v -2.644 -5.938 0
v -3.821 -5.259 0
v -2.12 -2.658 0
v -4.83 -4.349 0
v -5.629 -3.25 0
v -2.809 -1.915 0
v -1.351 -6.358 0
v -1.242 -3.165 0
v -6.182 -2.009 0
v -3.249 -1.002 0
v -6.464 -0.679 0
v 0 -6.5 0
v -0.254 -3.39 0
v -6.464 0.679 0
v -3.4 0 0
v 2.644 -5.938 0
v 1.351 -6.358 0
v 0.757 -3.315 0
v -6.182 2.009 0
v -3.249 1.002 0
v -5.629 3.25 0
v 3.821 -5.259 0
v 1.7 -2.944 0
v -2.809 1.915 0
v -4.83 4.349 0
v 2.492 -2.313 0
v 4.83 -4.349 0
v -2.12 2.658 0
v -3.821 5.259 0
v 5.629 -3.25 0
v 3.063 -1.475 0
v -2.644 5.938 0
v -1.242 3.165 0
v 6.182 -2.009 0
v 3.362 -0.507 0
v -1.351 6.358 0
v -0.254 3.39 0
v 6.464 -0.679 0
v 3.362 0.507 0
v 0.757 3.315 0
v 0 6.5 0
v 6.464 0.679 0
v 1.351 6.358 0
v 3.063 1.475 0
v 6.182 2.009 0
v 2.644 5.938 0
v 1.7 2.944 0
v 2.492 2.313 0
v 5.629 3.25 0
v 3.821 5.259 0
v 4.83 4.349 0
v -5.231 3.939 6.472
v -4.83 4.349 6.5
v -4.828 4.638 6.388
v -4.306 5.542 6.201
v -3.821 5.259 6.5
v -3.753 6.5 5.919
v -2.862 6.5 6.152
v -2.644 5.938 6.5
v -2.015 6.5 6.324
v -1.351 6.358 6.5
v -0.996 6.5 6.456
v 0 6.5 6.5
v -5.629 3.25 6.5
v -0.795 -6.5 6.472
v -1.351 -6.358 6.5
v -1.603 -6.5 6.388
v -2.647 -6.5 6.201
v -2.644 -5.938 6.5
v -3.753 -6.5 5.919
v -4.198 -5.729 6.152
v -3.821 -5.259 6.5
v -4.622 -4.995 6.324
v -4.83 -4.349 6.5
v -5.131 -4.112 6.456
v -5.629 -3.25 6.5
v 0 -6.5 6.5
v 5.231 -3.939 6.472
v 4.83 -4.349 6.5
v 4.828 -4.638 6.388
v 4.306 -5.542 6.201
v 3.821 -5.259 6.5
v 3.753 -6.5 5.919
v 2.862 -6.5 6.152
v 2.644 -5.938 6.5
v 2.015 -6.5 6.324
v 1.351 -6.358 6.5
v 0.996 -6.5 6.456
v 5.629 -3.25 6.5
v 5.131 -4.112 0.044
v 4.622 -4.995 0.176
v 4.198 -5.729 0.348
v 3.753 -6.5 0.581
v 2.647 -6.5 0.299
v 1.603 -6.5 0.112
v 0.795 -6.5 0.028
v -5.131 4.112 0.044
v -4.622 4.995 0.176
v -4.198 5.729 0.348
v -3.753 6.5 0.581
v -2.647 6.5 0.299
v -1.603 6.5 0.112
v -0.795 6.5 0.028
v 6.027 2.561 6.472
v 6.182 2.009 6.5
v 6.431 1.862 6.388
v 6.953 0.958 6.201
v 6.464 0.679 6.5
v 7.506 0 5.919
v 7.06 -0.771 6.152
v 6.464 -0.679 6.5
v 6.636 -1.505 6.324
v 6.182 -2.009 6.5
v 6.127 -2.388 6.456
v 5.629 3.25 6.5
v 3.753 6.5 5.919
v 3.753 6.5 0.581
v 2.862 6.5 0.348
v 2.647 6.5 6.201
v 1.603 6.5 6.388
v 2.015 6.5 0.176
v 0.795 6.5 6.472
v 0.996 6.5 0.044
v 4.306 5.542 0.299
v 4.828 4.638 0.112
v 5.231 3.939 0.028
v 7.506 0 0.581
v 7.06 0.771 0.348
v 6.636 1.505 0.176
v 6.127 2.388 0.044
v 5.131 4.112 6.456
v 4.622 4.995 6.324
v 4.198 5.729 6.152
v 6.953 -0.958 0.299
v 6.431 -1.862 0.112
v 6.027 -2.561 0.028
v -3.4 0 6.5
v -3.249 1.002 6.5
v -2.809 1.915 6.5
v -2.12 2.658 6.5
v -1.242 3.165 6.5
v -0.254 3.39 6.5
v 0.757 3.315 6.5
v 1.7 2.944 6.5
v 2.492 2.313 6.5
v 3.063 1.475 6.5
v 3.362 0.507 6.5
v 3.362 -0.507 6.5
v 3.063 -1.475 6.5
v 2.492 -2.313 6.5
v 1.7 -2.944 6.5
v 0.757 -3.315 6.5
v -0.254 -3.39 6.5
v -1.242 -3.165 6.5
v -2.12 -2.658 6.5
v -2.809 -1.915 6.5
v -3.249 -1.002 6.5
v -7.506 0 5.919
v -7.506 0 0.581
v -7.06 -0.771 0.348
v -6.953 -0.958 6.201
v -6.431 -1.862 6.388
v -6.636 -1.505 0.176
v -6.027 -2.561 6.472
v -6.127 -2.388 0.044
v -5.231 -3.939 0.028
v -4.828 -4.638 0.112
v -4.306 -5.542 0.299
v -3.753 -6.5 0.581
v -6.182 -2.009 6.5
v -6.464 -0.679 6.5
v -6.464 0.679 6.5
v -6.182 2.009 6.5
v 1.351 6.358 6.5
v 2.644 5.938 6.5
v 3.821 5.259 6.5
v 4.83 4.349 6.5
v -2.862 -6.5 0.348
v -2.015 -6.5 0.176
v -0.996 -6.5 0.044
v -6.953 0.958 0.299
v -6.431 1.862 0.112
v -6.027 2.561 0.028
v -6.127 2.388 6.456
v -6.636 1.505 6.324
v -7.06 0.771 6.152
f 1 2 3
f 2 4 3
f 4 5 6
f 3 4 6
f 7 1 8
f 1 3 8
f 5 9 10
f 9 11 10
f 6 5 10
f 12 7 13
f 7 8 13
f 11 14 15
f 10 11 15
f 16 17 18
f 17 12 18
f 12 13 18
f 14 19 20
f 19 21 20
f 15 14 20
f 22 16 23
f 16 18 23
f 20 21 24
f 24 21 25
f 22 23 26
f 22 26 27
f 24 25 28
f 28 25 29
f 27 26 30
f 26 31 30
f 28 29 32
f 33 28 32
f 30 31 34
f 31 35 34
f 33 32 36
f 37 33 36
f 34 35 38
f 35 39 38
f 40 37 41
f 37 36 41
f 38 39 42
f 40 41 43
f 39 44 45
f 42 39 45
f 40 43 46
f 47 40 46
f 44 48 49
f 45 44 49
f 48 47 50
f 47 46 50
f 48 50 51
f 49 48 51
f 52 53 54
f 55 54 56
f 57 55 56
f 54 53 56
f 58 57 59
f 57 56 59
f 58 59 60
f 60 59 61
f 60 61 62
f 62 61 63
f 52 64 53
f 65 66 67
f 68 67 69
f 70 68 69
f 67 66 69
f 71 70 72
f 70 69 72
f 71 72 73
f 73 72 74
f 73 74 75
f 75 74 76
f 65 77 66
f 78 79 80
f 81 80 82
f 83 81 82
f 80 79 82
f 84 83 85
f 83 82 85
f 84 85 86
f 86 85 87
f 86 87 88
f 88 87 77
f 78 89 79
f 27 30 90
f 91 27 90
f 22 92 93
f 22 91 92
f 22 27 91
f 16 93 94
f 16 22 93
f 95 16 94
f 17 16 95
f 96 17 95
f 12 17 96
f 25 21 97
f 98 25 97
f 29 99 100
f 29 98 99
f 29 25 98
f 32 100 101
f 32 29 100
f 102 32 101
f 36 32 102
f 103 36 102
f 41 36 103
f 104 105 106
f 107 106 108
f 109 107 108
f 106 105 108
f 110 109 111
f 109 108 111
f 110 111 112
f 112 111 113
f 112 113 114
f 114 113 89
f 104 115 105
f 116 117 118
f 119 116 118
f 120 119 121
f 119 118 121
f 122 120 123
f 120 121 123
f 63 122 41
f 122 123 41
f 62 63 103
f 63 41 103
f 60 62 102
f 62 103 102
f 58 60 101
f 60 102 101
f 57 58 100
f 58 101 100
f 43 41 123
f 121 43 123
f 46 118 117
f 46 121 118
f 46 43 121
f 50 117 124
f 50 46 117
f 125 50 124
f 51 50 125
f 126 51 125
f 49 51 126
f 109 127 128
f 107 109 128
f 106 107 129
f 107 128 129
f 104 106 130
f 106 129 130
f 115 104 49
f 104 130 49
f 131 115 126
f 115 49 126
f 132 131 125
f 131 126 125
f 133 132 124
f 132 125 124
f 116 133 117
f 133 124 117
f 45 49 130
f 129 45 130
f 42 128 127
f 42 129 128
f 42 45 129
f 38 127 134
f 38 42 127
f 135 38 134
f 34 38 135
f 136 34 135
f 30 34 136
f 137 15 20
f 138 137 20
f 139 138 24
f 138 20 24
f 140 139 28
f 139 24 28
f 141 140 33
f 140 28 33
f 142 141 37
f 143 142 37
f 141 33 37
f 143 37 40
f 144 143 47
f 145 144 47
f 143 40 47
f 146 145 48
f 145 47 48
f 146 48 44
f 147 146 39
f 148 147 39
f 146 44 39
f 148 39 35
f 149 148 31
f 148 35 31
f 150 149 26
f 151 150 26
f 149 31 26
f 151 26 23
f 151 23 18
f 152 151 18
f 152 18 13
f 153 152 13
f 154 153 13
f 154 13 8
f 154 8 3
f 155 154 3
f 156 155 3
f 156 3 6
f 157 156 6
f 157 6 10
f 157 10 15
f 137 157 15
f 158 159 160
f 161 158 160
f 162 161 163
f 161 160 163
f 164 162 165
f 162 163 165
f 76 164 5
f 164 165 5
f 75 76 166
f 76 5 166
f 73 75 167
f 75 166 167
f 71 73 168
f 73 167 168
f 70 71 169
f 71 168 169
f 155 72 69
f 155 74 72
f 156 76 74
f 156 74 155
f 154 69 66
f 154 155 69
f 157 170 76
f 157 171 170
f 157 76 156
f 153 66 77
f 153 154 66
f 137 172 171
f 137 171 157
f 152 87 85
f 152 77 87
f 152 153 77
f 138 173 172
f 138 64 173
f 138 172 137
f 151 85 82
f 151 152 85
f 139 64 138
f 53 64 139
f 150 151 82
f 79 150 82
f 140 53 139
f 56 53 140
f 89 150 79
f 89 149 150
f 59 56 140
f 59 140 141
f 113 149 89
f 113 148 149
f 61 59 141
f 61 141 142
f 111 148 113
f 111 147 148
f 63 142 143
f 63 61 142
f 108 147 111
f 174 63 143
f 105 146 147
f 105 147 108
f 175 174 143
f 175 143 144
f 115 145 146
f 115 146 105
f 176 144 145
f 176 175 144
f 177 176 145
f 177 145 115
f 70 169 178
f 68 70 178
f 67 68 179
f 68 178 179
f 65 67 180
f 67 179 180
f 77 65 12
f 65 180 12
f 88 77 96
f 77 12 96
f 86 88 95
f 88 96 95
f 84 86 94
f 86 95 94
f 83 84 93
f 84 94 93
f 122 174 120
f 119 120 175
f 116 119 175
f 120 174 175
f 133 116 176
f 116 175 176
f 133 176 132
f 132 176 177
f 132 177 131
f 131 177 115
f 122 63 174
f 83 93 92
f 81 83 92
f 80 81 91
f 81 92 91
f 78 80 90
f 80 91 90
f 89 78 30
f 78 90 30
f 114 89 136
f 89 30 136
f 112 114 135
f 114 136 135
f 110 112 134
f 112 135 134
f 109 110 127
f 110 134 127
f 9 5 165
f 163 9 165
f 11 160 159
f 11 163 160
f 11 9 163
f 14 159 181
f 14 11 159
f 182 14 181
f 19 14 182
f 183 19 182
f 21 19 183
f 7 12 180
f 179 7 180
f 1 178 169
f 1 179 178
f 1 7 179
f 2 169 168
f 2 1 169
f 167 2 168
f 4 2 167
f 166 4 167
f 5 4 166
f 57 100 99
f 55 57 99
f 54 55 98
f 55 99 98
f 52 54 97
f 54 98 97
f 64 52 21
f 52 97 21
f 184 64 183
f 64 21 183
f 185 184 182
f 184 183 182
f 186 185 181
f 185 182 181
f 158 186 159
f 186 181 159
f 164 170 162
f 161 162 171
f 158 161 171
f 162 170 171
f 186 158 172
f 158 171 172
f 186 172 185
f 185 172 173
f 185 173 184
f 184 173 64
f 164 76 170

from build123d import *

# Parameters (mm, degrees)
BOSS_EXTRUDE1_DEPTH = 6.5
M8_TAPPED_HOLE1_D   = 6.8


with BuildPart() as part:
    # Sketch1 → Boss-Extrude1 (new body)
    with BuildSketch(Plane.XY):
        Polygon((3.75277675, -6.5), (7.505553499, 0), (3.75277675, 6.5), (-3.75277675, 6.5), (-7.505553499, 0), (-3.75277675, -6.5), align=None)
    extrude(amount=BOSS_EXTRUDE1_DEPTH)

    # Sketch3 → Cut-Revolve1 (revolve, cut)
    with BuildSketch(Plane(origin=(0, 0, 0), x_dir=(0, 0, -1), z_dir=(1, 0, 0))):
        Polygon((-1.711637245, 9.464642673), (0, 6.5), (0, 9.464642673), align=None)
        Polygon((-6.5, 6.5), (-6.5, 9.37662807), (-4.839178009, 9.37662807), align=None)
    revolve(axis=Axis((0, 0, 0), (0, 0, -1)), mode=Mode.SUBTRACT)

    # M8 Tapped Hole1 (through all)
    with Locations(Plane.XY.offset(6.5)):
        with Locations((0, 0)):
            Hole(M8_TAPPED_HOLE1_D / 2)


solid = part.part
